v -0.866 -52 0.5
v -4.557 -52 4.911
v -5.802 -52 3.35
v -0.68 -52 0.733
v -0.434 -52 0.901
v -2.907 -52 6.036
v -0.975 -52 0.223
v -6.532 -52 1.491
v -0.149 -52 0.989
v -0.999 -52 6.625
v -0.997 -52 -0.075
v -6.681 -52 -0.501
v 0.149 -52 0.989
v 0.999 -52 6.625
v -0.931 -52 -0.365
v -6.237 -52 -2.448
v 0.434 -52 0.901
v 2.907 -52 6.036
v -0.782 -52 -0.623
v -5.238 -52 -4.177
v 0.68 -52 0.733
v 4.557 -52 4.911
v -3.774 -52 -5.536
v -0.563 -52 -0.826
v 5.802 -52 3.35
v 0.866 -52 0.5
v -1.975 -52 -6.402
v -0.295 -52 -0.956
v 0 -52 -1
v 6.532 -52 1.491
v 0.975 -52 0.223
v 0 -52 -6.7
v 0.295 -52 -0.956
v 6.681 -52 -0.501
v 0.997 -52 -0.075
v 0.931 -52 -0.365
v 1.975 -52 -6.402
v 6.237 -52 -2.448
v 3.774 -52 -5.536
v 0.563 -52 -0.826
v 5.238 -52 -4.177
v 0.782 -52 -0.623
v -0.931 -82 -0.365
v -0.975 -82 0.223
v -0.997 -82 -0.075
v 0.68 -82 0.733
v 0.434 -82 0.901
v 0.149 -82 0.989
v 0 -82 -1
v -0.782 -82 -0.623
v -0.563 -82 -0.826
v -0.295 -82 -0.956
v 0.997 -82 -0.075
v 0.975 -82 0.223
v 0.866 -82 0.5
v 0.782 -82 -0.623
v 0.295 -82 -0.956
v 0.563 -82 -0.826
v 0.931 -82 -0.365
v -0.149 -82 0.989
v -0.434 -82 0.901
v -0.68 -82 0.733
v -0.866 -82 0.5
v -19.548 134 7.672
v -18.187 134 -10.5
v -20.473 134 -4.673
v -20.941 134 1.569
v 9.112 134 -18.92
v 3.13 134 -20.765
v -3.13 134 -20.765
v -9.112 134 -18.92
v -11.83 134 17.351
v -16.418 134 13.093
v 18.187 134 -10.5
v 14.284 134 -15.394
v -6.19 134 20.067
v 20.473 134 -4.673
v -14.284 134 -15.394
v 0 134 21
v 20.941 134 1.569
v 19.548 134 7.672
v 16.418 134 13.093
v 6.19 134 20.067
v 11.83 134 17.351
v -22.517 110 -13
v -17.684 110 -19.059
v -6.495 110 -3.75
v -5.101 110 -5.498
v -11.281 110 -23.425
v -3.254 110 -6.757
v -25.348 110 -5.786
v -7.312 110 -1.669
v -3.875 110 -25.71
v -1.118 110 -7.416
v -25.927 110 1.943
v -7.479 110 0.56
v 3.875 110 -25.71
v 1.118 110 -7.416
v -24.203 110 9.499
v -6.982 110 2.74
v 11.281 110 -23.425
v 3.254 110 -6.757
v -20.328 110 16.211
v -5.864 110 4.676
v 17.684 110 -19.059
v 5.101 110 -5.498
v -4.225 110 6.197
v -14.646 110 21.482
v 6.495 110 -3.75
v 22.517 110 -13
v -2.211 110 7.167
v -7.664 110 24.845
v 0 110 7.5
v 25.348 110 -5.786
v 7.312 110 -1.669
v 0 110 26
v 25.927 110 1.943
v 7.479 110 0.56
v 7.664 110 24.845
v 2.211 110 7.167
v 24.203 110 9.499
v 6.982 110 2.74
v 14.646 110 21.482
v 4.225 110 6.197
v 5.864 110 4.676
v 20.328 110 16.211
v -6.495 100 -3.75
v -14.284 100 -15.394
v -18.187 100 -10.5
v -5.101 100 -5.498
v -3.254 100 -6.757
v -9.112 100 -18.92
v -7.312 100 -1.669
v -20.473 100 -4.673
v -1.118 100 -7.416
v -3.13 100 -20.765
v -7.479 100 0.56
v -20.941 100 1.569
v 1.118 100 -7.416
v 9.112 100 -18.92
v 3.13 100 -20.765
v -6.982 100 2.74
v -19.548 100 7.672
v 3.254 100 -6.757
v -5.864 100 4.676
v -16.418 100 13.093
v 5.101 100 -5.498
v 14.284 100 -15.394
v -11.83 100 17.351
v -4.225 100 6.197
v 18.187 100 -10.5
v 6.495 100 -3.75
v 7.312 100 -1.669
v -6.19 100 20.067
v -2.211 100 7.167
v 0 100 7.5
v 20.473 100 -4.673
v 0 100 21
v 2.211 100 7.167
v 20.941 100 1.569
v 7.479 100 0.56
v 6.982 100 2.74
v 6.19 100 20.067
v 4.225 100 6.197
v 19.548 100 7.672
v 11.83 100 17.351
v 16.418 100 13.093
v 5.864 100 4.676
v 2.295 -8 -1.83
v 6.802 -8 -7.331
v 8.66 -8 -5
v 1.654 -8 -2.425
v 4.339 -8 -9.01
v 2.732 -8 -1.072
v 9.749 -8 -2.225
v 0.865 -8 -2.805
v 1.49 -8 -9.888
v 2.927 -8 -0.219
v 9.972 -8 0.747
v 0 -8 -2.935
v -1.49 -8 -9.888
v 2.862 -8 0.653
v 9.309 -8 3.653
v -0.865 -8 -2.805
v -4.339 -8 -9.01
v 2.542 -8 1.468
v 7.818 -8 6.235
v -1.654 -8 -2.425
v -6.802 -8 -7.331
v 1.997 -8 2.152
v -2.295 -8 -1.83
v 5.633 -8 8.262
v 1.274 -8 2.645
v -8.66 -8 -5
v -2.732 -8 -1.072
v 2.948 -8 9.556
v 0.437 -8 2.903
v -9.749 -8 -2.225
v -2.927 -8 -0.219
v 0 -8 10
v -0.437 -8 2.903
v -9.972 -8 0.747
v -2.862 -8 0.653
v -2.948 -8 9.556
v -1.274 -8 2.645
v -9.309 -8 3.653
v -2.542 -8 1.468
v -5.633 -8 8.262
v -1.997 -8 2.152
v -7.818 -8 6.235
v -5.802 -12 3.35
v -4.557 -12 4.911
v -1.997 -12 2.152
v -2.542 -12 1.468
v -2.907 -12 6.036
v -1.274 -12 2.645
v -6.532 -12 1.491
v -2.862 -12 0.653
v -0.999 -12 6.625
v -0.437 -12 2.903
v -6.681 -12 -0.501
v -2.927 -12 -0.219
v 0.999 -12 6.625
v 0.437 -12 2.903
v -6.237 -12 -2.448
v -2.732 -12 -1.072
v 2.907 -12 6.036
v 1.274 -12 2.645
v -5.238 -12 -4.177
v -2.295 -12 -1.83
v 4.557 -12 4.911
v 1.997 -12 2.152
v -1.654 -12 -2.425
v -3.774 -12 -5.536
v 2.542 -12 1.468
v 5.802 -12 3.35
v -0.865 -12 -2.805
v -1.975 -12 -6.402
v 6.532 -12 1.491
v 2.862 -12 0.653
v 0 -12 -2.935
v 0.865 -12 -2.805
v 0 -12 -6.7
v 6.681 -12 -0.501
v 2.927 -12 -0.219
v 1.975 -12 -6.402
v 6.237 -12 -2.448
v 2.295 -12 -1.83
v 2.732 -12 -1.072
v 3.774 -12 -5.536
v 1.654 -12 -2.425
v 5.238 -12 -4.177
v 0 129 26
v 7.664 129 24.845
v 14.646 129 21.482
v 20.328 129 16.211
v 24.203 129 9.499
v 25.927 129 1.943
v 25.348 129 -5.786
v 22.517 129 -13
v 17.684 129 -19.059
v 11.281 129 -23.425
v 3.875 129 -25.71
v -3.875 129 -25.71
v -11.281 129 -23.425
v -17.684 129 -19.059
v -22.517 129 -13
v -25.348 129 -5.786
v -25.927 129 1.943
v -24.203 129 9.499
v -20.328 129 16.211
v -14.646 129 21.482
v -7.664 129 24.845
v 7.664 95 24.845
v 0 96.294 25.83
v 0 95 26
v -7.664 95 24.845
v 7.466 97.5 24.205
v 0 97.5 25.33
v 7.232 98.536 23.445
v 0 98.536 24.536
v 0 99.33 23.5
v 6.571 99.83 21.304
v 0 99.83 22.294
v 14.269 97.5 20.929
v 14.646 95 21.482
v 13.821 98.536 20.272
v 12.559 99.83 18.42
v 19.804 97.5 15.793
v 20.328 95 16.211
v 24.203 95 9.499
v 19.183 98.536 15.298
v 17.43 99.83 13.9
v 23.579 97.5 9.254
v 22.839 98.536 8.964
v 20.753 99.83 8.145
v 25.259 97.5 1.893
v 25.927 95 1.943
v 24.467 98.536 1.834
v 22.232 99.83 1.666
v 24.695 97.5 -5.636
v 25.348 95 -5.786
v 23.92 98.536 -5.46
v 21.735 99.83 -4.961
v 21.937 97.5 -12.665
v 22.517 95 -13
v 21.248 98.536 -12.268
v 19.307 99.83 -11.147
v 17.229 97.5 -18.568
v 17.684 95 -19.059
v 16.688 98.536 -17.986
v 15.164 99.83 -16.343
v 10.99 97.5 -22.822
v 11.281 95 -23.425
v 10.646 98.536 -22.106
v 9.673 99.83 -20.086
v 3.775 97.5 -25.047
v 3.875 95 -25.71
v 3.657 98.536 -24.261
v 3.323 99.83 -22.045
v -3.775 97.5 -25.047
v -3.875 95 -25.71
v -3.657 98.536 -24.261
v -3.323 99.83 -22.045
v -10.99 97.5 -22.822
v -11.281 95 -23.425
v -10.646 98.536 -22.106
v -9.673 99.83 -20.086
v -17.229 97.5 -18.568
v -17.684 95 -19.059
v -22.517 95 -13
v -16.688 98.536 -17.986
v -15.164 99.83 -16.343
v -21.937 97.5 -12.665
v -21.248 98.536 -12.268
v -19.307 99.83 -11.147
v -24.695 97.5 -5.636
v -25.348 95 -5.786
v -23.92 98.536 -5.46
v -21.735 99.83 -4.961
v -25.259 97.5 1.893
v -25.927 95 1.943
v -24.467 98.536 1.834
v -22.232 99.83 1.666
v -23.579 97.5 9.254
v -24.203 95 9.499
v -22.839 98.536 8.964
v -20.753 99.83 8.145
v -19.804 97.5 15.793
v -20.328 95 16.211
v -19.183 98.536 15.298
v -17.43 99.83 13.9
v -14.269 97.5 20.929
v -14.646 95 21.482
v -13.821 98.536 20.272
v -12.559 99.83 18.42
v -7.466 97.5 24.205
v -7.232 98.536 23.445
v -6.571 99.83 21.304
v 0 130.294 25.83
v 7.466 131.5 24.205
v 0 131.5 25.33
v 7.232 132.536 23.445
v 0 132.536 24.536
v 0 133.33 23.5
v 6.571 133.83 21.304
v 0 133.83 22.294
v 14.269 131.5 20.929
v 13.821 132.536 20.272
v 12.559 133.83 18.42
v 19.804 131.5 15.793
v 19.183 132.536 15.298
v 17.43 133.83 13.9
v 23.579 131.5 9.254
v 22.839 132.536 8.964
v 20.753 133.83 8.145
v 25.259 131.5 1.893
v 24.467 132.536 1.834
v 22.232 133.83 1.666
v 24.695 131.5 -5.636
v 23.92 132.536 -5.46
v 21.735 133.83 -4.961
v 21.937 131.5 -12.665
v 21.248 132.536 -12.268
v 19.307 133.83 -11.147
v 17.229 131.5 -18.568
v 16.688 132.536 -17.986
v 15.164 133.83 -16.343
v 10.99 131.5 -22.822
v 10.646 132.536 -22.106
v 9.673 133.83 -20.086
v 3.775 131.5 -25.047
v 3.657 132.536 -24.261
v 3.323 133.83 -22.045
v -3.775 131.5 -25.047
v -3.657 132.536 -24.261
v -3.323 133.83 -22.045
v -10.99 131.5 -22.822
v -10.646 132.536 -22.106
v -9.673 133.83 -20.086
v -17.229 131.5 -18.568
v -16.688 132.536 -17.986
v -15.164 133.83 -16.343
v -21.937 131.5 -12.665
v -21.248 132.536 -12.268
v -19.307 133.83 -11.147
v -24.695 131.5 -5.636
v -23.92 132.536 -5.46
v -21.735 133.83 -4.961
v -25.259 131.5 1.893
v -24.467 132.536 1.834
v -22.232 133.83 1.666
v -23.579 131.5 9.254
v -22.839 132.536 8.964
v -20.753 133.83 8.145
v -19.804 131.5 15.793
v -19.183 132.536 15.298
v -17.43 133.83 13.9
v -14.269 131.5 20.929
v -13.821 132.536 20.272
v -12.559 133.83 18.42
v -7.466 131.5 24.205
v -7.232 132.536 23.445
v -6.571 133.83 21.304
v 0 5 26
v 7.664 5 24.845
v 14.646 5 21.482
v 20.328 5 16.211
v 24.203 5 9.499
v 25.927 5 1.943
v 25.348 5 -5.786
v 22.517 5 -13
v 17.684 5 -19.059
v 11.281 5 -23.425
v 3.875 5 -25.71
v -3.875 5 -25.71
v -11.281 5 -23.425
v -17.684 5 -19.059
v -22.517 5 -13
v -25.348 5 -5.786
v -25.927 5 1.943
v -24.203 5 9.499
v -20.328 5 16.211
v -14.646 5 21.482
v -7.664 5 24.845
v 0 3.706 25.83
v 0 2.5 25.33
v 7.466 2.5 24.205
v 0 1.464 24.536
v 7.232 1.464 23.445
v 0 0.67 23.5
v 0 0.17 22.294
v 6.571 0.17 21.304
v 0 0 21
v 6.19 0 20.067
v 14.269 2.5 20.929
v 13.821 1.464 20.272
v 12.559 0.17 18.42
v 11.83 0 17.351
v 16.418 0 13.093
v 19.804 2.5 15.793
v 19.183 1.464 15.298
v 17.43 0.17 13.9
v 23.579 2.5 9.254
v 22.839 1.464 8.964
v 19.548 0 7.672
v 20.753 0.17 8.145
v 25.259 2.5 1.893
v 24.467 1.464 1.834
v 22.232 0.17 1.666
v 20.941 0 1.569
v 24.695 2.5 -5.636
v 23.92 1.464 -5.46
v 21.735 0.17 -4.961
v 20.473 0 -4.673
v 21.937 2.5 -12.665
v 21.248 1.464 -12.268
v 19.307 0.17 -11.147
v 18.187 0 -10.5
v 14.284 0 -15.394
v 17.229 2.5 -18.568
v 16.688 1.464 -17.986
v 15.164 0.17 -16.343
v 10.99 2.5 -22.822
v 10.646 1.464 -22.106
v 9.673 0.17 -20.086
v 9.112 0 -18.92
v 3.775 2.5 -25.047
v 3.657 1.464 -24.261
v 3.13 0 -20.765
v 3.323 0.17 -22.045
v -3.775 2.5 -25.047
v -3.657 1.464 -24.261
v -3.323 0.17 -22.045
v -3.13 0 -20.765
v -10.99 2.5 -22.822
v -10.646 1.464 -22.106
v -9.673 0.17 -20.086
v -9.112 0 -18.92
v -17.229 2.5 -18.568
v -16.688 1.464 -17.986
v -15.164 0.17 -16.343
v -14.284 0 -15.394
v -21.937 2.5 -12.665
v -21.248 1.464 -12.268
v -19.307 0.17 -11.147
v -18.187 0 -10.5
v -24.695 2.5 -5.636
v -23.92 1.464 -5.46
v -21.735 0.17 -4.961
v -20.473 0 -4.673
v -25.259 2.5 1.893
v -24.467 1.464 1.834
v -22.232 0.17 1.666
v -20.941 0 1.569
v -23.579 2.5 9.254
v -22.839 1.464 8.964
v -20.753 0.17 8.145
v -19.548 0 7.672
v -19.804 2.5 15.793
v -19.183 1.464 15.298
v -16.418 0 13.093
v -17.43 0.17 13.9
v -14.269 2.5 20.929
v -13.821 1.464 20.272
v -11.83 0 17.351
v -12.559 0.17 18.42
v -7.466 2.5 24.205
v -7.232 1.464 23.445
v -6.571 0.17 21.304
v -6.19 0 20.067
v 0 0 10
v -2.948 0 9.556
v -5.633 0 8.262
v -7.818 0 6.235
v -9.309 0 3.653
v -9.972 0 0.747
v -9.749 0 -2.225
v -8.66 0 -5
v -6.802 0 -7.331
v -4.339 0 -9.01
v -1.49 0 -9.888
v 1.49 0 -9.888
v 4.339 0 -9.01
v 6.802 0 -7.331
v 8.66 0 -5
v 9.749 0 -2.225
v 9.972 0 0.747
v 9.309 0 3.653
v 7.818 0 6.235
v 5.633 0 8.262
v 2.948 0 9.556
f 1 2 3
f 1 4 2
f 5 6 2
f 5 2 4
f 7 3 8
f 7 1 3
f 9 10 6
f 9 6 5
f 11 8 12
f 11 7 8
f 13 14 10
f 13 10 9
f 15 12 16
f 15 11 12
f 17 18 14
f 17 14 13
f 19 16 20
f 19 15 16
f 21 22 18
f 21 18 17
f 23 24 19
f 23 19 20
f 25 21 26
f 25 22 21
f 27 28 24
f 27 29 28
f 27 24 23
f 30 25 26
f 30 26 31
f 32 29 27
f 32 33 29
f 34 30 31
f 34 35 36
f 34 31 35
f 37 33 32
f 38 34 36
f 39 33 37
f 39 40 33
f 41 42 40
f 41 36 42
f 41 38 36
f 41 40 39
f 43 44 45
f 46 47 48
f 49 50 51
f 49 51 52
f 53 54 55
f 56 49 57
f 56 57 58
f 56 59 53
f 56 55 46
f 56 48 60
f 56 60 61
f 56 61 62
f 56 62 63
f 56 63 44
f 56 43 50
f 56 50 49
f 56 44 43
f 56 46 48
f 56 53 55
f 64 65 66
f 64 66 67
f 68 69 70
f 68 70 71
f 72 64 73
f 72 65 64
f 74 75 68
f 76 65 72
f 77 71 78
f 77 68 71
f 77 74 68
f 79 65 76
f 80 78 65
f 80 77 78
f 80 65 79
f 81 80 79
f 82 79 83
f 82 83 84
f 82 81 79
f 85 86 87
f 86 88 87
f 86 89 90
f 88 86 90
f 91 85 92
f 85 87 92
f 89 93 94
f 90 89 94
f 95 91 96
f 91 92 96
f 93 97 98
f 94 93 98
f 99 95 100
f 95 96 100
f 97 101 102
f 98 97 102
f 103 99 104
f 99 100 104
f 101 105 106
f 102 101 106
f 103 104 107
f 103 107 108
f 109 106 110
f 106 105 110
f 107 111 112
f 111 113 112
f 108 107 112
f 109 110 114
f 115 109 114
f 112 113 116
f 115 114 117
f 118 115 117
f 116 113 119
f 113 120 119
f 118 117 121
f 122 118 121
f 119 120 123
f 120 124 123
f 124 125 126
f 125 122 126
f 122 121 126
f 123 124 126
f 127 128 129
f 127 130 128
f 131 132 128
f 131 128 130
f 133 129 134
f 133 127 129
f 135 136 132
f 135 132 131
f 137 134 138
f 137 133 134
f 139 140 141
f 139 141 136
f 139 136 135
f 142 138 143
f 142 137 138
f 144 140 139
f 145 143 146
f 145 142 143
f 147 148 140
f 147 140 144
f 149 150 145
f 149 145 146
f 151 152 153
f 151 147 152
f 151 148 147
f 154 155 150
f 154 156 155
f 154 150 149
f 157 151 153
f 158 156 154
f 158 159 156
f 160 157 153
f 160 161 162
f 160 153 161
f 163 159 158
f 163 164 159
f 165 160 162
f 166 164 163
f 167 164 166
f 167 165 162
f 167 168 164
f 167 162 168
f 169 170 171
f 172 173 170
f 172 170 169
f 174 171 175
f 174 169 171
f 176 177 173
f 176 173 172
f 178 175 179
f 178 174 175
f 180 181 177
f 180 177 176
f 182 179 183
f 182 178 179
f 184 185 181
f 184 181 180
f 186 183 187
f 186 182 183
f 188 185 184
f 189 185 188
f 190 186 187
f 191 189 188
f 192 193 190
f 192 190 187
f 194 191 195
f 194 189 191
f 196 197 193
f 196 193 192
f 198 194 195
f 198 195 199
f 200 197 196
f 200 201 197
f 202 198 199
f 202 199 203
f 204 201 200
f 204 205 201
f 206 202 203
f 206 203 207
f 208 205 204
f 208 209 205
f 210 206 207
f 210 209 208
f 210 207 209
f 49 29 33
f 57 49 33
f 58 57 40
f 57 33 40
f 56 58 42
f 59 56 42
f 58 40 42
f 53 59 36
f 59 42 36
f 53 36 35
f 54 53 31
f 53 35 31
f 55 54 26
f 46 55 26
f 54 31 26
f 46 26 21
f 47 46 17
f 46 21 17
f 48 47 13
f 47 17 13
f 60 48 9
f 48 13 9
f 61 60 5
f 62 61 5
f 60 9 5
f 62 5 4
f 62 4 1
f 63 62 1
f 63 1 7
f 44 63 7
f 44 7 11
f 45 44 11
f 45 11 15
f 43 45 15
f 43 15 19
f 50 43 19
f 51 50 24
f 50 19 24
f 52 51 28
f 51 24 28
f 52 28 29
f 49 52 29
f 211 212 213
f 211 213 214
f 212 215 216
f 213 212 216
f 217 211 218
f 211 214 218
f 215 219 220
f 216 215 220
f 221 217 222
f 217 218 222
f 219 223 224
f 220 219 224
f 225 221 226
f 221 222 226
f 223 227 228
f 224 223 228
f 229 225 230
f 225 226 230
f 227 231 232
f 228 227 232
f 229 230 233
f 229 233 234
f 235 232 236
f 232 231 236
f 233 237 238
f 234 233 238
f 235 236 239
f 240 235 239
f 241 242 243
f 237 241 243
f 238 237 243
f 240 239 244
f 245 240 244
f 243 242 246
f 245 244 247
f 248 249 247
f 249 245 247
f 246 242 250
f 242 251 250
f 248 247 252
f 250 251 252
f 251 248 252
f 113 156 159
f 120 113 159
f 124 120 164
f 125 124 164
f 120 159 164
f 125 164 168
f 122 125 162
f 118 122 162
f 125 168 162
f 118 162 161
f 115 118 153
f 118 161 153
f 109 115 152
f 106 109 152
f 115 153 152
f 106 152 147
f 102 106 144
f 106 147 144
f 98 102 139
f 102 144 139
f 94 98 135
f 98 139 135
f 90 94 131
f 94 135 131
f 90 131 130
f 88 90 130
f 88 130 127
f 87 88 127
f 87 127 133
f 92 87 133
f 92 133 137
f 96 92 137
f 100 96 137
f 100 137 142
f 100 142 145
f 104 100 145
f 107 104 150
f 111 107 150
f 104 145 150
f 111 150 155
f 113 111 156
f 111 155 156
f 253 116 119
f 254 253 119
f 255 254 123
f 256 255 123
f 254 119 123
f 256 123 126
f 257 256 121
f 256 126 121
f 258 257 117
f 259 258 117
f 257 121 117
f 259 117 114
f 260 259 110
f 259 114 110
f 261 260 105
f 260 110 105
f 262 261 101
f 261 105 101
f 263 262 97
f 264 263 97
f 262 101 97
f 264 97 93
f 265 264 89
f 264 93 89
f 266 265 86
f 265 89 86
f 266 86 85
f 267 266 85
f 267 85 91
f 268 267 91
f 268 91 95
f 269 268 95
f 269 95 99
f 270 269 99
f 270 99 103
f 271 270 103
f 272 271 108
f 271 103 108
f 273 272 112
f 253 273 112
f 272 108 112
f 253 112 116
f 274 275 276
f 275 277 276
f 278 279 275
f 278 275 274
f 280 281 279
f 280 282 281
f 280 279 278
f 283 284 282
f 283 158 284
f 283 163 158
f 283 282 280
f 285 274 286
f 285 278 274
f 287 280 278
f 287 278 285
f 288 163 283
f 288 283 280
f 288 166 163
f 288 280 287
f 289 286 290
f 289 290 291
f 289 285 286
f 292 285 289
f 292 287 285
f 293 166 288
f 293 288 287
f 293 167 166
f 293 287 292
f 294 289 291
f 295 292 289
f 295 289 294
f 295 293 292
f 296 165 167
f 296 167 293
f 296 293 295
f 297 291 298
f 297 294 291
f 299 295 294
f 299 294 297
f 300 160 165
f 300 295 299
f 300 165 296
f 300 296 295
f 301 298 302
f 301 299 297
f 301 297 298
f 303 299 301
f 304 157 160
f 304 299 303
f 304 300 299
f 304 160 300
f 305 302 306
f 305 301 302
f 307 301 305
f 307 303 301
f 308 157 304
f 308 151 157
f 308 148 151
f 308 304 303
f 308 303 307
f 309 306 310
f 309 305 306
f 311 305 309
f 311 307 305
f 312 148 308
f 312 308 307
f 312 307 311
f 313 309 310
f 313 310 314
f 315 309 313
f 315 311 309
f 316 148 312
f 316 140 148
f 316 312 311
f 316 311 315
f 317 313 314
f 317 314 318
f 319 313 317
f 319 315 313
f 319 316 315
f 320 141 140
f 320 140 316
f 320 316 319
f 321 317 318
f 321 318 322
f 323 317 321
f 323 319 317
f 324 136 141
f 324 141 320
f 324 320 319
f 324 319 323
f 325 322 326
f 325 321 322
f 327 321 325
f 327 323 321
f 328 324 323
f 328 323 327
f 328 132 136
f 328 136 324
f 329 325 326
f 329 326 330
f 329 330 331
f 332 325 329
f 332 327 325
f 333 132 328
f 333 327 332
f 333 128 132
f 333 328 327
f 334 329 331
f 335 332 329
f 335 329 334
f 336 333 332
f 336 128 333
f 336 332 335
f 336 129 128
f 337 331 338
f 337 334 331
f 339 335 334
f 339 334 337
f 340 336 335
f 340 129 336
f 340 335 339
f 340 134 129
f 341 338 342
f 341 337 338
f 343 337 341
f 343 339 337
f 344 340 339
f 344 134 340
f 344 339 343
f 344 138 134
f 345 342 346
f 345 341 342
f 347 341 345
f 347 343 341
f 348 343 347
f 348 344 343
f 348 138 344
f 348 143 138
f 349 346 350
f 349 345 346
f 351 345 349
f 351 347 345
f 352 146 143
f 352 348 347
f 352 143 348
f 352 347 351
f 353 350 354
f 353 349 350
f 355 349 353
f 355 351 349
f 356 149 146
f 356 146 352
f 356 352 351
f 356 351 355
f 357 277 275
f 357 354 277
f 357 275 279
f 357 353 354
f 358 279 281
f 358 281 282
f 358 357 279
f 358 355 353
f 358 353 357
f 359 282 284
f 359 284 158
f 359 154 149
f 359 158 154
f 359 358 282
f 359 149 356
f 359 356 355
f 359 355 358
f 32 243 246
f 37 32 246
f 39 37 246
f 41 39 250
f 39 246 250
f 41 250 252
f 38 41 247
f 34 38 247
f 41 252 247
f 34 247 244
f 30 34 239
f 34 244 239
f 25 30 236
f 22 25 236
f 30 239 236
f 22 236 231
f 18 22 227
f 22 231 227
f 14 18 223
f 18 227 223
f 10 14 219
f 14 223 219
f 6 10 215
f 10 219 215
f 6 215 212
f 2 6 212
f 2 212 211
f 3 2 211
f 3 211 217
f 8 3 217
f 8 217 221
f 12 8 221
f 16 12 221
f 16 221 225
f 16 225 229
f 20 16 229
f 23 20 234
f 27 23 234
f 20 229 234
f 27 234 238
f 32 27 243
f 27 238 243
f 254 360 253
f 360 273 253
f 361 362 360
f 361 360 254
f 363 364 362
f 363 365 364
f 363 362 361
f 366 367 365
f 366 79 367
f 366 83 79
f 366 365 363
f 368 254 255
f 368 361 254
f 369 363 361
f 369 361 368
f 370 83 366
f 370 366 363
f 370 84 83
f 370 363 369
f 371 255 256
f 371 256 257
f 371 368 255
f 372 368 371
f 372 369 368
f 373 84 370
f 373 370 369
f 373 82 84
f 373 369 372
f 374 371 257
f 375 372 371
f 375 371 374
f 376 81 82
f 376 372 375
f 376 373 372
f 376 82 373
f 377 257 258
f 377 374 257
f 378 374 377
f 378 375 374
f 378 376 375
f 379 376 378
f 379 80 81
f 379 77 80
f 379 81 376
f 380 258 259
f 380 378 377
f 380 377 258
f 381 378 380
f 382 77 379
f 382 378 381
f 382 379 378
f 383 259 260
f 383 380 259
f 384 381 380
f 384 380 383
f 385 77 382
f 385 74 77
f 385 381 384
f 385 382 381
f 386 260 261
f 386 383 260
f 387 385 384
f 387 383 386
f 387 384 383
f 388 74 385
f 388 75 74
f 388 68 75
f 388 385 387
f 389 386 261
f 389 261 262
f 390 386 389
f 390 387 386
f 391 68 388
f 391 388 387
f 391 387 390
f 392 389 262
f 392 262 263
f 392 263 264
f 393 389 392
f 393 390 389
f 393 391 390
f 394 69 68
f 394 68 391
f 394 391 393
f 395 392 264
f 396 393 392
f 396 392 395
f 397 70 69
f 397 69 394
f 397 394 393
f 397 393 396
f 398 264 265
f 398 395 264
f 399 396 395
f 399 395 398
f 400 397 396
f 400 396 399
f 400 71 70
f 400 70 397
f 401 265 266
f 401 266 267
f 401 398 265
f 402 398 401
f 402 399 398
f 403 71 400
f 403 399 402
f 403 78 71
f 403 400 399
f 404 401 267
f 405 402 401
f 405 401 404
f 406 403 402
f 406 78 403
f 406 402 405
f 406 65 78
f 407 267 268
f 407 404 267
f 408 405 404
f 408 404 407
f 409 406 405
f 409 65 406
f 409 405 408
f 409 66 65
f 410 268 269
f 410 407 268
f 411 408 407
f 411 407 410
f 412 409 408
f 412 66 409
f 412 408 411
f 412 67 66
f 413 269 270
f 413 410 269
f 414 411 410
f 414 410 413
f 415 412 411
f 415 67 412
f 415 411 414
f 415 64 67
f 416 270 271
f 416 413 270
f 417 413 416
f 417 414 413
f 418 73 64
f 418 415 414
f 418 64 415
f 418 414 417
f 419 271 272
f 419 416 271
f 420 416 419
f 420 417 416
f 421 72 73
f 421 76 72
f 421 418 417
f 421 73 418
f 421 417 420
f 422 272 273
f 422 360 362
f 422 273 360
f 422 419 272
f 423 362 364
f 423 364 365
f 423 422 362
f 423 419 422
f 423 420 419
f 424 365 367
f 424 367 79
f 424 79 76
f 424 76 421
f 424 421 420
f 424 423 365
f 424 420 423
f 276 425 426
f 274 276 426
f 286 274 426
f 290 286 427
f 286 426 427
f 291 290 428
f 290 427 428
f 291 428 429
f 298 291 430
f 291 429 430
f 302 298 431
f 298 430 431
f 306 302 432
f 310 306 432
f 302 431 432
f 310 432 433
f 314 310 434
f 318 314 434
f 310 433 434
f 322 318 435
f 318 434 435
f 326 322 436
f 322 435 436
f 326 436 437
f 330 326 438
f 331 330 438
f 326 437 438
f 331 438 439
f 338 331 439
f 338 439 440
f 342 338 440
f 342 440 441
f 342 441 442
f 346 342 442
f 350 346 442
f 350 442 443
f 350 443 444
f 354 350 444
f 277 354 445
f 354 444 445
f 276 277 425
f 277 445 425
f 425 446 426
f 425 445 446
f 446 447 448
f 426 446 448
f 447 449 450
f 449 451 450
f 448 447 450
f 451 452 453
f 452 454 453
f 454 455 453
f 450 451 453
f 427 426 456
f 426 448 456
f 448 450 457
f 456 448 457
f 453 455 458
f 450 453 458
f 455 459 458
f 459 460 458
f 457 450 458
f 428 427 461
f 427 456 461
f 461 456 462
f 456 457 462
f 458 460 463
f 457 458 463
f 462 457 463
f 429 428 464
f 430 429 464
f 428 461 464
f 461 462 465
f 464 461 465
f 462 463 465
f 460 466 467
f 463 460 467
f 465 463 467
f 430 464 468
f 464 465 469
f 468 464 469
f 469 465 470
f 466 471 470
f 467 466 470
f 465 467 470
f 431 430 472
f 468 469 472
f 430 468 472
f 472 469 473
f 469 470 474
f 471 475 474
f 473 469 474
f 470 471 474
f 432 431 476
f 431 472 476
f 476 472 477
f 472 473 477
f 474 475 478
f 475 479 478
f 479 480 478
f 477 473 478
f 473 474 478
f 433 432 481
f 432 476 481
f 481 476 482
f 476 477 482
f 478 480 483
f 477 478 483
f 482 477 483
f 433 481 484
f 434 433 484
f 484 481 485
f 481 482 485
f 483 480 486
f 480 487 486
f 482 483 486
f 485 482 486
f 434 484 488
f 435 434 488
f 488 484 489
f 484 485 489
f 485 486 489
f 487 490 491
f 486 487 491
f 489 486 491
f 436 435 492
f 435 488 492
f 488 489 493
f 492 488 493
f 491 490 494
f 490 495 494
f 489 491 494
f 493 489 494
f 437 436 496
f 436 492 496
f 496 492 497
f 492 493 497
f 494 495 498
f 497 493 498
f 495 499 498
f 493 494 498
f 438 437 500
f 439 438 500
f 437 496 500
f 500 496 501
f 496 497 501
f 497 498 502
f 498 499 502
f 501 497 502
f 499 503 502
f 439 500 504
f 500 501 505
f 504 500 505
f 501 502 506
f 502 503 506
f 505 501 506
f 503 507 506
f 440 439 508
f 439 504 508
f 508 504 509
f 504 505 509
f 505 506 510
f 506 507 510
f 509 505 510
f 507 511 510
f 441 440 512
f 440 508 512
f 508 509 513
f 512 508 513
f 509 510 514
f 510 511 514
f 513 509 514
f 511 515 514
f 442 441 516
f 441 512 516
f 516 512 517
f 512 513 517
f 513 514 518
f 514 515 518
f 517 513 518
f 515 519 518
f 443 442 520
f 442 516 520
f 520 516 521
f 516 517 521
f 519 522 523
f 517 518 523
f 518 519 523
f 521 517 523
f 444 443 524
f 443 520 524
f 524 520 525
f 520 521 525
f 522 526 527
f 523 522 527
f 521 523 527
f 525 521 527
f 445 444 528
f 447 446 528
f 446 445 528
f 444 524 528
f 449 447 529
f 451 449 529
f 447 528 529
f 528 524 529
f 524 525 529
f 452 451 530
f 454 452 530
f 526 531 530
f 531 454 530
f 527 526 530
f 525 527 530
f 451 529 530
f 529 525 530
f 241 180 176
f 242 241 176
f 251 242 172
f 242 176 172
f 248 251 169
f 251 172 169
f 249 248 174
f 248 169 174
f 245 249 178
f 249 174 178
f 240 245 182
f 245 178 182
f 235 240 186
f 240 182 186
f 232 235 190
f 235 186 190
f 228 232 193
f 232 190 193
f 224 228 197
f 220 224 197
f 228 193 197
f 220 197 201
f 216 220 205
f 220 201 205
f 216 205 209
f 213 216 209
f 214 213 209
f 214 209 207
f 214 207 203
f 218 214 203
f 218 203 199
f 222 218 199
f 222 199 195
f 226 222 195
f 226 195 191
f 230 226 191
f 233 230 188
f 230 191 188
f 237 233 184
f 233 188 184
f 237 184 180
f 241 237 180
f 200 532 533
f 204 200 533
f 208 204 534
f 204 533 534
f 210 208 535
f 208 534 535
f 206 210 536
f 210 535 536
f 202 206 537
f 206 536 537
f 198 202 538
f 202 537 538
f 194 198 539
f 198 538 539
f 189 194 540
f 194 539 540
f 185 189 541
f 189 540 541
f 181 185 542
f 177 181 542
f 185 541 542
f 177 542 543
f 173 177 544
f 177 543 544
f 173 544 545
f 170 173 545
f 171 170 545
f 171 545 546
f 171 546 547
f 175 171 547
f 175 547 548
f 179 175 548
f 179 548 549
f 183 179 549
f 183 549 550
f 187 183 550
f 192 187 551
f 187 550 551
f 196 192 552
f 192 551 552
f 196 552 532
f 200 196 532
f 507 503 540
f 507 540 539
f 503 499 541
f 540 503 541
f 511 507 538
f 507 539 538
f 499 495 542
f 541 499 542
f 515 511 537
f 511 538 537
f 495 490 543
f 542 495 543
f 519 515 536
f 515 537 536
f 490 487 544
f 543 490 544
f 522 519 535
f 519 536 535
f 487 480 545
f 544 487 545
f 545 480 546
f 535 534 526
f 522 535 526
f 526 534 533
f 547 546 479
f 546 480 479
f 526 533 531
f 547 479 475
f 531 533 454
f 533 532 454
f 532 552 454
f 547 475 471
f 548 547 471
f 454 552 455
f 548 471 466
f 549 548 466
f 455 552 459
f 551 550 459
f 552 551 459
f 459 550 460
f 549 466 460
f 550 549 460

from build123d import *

# Parameters (mm, degrees)
SKETCH1_R           = 26
BOSS_EXTRUDE2_DEPTH = 100
SKETCH2_R           = 7.5
BOSS_EXTRUDE4_DEPTH = 10
SKETCH3_R           = 26
BOSS_EXTRUDE5_DEPTH = 24
FILLET1_R           = 5
FILLET2_R           = 5
FILLET3_R           = 5
SKETCH4_R           = 10
BOSS_EXTRUDE6_DEPTH = 8
SKETCH5_R           = 2.935336569
BOSS_EXTRUDE7_DEPTH = 4
SKETCH6_R           = 6.699984979
BOSS_EXTRUDE8_DEPTH = 40
SKETCH7_R           = 1
BOSS_EXTRUDE9_DEPTH = 30


with BuildPart() as part:
    # Sketch1 → Boss-Extrude2 (new body)
    with BuildSketch(Plane(origin=(0, 0, 0), x_dir=(1, 0, 0), z_dir=(0, 1, 0))):
        with Locations(Location((0, 0, 0), (0, 0, 270))):
            Circle(SKETCH1_R)
    extrude(amount=BOSS_EXTRUDE2_DEPTH)

    # Sketch2 → Boss-Extrude4 (add)
    with BuildSketch(Plane(origin=(0, 100, 0), x_dir=(1, 0, 0), z_dir=(0, 1, 0))):
        with Locations(Location((0, 0, 0), (0, 0, 270))):
            Circle(SKETCH2_R)
    extrude(amount=BOSS_EXTRUDE4_DEPTH)

    # Sketch3 → Boss-Extrude5 (add)
    with BuildSketch(Plane(origin=(0, 110, 0), x_dir=(1, 0, 0), z_dir=(0, 1, 0))):
        with Locations(Location((0, 0, 0), (0, 0, 270))):
            Circle(SKETCH3_R)
    extrude(amount=BOSS_EXTRUDE5_DEPTH)

    # Fillet1
    fillet1_edges = [part.edges().sort_by_distance(p)[0] for p in [
        (0, 0, -26),
    ]]
    fillet(fillet1_edges, radius=FILLET1_R)

    # Fillet2
    fillet2_edges = [part.edges().sort_by_distance(p)[0] for p in [
        (0, 100, -26),
    ]]
    fillet(fillet2_edges, radius=FILLET2_R)

    # Fillet3
    fillet3_edges = [part.edges().sort_by_distance(p)[0] for p in [
        (0, 134, -26),
    ]]
    fillet(fillet3_edges, radius=FILLET3_R)

    # Sketch4 → Boss-Extrude6 (add)
    with BuildSketch(Plane.XZ):
        with Locations(Location((0, 0, 0), (0, 0, 90))):
            Circle(SKETCH4_R)
    extrude(amount=BOSS_EXTRUDE6_DEPTH)

    # Sketch5 → Boss-Extrude7 (add)
    with BuildSketch(Plane.XZ.offset(8)):
        with Locations(Location((0, 0, 0), (0, 0, 270))):
            Circle(SKETCH5_R)
    extrude(amount=BOSS_EXTRUDE7_DEPTH)

    # Sketch6 → Boss-Extrude8 (add)
    with BuildSketch(Plane.XZ.offset(12)):
        with Locations(Location((0, 0, 0), (0, 0, 270))):
            Circle(SKETCH6_R)
    extrude(amount=BOSS_EXTRUDE8_DEPTH)

    # Sketch7 → Boss-Extrude9 (add)
    with BuildSketch(Plane.XZ.offset(52)):
        with Locations(Location((0, 0, 0), (0, 0, 270))):
            Circle(SKETCH7_R)
    extrude(amount=BOSS_EXTRUDE9_DEPTH)


solid = part.part
